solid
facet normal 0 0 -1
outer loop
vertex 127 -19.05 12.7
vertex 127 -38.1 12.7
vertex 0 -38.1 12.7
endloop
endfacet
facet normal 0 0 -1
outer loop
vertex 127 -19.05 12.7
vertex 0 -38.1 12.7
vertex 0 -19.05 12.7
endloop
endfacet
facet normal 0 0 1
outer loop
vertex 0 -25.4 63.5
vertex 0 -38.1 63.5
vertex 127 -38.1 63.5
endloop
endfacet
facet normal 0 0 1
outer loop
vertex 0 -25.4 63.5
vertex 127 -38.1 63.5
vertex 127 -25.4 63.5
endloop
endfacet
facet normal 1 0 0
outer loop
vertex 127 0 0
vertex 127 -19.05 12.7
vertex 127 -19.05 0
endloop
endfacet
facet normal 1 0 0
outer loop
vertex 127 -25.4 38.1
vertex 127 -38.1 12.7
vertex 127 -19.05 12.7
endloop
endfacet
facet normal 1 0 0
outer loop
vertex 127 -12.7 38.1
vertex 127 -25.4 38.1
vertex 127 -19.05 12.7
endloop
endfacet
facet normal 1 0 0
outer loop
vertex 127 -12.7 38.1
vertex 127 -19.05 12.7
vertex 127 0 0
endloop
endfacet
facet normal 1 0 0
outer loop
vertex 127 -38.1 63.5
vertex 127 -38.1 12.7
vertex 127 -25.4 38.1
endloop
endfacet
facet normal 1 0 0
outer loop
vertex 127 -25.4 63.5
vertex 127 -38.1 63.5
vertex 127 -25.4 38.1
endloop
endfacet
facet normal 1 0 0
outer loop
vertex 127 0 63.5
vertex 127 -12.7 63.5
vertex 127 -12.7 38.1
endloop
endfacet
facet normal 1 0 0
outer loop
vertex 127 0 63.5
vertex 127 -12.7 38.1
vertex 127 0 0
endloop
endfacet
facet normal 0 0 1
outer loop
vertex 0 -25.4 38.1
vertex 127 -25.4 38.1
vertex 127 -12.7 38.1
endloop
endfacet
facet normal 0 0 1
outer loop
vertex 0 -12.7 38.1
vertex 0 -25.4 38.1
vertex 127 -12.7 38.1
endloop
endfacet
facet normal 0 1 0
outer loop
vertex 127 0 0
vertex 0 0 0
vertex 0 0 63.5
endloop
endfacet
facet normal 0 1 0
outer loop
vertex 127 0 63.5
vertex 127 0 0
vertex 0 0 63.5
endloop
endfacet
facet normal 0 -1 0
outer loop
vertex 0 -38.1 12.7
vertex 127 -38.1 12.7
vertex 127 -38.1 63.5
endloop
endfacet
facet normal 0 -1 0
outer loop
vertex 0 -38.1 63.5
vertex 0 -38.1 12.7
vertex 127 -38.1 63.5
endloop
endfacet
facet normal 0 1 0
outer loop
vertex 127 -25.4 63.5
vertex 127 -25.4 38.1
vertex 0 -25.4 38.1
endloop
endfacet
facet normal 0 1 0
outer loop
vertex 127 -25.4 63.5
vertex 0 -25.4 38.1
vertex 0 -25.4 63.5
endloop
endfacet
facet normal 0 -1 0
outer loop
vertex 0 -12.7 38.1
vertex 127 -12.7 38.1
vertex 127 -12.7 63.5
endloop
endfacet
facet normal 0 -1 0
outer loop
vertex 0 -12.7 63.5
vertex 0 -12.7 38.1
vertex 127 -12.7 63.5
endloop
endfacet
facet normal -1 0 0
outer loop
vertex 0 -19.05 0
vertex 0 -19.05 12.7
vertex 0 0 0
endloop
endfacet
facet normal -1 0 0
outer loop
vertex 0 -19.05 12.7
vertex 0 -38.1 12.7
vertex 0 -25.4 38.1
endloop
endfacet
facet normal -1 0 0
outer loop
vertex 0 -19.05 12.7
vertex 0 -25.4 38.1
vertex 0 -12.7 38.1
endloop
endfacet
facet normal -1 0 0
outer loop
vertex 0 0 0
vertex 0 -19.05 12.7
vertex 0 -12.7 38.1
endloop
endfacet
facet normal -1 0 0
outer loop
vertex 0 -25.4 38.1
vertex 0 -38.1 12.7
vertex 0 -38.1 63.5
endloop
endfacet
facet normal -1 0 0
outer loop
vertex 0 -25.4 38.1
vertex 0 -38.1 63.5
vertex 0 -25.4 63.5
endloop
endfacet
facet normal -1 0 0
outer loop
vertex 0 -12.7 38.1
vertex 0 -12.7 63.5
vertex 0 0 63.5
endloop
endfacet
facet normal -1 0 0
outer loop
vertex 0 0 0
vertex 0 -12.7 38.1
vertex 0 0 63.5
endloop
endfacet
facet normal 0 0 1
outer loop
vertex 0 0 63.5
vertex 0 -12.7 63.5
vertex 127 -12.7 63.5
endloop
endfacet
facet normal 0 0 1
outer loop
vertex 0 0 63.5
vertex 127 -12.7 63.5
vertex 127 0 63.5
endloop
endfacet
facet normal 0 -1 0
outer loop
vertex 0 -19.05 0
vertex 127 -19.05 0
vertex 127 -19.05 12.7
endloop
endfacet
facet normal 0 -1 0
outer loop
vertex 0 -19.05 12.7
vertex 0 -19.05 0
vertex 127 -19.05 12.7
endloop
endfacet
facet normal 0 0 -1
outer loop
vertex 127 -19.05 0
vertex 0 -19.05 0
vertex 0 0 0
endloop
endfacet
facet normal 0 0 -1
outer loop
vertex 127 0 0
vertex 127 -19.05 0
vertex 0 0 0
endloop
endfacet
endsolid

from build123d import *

# Parameters (mm, degrees)
F0_W     = 38.1
F0_H     = 63.5
F1_DEPTH = 127
F2_W     = 19.05
F2_H     = 12.7
F3_DEPTH = 127.001
F4_W     = 12.7
F4_H     = 25.4
F5_DEPTH = 127.001


with BuildPart() as f1:
    # F0 (on Right) → F1 (new body)
    with BuildSketch(Plane.YZ):
        with Locations((-19.05, 31.75)):
            Rectangle(F0_W, F0_H)
    extrude(amount=F1_DEPTH)

    # F2 (on face) → F3 (cut, through all)
    with BuildSketch(Plane.YZ.offset(127)):
        with Locations((-28.575, 6.35)):
            Rectangle(F2_W, F2_H)
    extrude(amount=-F3_DEPTH, mode=Mode.SUBTRACT)

    # F4 (on face) → F5 (cut, through all)
    with BuildSketch(Plane.YZ.offset(127)):
        with Locations((-19.05, 50.8)):
            Rectangle(F4_W, F4_H)
    extrude(amount=-F5_DEPTH, mode=Mode.SUBTRACT)


solid = f1.part
